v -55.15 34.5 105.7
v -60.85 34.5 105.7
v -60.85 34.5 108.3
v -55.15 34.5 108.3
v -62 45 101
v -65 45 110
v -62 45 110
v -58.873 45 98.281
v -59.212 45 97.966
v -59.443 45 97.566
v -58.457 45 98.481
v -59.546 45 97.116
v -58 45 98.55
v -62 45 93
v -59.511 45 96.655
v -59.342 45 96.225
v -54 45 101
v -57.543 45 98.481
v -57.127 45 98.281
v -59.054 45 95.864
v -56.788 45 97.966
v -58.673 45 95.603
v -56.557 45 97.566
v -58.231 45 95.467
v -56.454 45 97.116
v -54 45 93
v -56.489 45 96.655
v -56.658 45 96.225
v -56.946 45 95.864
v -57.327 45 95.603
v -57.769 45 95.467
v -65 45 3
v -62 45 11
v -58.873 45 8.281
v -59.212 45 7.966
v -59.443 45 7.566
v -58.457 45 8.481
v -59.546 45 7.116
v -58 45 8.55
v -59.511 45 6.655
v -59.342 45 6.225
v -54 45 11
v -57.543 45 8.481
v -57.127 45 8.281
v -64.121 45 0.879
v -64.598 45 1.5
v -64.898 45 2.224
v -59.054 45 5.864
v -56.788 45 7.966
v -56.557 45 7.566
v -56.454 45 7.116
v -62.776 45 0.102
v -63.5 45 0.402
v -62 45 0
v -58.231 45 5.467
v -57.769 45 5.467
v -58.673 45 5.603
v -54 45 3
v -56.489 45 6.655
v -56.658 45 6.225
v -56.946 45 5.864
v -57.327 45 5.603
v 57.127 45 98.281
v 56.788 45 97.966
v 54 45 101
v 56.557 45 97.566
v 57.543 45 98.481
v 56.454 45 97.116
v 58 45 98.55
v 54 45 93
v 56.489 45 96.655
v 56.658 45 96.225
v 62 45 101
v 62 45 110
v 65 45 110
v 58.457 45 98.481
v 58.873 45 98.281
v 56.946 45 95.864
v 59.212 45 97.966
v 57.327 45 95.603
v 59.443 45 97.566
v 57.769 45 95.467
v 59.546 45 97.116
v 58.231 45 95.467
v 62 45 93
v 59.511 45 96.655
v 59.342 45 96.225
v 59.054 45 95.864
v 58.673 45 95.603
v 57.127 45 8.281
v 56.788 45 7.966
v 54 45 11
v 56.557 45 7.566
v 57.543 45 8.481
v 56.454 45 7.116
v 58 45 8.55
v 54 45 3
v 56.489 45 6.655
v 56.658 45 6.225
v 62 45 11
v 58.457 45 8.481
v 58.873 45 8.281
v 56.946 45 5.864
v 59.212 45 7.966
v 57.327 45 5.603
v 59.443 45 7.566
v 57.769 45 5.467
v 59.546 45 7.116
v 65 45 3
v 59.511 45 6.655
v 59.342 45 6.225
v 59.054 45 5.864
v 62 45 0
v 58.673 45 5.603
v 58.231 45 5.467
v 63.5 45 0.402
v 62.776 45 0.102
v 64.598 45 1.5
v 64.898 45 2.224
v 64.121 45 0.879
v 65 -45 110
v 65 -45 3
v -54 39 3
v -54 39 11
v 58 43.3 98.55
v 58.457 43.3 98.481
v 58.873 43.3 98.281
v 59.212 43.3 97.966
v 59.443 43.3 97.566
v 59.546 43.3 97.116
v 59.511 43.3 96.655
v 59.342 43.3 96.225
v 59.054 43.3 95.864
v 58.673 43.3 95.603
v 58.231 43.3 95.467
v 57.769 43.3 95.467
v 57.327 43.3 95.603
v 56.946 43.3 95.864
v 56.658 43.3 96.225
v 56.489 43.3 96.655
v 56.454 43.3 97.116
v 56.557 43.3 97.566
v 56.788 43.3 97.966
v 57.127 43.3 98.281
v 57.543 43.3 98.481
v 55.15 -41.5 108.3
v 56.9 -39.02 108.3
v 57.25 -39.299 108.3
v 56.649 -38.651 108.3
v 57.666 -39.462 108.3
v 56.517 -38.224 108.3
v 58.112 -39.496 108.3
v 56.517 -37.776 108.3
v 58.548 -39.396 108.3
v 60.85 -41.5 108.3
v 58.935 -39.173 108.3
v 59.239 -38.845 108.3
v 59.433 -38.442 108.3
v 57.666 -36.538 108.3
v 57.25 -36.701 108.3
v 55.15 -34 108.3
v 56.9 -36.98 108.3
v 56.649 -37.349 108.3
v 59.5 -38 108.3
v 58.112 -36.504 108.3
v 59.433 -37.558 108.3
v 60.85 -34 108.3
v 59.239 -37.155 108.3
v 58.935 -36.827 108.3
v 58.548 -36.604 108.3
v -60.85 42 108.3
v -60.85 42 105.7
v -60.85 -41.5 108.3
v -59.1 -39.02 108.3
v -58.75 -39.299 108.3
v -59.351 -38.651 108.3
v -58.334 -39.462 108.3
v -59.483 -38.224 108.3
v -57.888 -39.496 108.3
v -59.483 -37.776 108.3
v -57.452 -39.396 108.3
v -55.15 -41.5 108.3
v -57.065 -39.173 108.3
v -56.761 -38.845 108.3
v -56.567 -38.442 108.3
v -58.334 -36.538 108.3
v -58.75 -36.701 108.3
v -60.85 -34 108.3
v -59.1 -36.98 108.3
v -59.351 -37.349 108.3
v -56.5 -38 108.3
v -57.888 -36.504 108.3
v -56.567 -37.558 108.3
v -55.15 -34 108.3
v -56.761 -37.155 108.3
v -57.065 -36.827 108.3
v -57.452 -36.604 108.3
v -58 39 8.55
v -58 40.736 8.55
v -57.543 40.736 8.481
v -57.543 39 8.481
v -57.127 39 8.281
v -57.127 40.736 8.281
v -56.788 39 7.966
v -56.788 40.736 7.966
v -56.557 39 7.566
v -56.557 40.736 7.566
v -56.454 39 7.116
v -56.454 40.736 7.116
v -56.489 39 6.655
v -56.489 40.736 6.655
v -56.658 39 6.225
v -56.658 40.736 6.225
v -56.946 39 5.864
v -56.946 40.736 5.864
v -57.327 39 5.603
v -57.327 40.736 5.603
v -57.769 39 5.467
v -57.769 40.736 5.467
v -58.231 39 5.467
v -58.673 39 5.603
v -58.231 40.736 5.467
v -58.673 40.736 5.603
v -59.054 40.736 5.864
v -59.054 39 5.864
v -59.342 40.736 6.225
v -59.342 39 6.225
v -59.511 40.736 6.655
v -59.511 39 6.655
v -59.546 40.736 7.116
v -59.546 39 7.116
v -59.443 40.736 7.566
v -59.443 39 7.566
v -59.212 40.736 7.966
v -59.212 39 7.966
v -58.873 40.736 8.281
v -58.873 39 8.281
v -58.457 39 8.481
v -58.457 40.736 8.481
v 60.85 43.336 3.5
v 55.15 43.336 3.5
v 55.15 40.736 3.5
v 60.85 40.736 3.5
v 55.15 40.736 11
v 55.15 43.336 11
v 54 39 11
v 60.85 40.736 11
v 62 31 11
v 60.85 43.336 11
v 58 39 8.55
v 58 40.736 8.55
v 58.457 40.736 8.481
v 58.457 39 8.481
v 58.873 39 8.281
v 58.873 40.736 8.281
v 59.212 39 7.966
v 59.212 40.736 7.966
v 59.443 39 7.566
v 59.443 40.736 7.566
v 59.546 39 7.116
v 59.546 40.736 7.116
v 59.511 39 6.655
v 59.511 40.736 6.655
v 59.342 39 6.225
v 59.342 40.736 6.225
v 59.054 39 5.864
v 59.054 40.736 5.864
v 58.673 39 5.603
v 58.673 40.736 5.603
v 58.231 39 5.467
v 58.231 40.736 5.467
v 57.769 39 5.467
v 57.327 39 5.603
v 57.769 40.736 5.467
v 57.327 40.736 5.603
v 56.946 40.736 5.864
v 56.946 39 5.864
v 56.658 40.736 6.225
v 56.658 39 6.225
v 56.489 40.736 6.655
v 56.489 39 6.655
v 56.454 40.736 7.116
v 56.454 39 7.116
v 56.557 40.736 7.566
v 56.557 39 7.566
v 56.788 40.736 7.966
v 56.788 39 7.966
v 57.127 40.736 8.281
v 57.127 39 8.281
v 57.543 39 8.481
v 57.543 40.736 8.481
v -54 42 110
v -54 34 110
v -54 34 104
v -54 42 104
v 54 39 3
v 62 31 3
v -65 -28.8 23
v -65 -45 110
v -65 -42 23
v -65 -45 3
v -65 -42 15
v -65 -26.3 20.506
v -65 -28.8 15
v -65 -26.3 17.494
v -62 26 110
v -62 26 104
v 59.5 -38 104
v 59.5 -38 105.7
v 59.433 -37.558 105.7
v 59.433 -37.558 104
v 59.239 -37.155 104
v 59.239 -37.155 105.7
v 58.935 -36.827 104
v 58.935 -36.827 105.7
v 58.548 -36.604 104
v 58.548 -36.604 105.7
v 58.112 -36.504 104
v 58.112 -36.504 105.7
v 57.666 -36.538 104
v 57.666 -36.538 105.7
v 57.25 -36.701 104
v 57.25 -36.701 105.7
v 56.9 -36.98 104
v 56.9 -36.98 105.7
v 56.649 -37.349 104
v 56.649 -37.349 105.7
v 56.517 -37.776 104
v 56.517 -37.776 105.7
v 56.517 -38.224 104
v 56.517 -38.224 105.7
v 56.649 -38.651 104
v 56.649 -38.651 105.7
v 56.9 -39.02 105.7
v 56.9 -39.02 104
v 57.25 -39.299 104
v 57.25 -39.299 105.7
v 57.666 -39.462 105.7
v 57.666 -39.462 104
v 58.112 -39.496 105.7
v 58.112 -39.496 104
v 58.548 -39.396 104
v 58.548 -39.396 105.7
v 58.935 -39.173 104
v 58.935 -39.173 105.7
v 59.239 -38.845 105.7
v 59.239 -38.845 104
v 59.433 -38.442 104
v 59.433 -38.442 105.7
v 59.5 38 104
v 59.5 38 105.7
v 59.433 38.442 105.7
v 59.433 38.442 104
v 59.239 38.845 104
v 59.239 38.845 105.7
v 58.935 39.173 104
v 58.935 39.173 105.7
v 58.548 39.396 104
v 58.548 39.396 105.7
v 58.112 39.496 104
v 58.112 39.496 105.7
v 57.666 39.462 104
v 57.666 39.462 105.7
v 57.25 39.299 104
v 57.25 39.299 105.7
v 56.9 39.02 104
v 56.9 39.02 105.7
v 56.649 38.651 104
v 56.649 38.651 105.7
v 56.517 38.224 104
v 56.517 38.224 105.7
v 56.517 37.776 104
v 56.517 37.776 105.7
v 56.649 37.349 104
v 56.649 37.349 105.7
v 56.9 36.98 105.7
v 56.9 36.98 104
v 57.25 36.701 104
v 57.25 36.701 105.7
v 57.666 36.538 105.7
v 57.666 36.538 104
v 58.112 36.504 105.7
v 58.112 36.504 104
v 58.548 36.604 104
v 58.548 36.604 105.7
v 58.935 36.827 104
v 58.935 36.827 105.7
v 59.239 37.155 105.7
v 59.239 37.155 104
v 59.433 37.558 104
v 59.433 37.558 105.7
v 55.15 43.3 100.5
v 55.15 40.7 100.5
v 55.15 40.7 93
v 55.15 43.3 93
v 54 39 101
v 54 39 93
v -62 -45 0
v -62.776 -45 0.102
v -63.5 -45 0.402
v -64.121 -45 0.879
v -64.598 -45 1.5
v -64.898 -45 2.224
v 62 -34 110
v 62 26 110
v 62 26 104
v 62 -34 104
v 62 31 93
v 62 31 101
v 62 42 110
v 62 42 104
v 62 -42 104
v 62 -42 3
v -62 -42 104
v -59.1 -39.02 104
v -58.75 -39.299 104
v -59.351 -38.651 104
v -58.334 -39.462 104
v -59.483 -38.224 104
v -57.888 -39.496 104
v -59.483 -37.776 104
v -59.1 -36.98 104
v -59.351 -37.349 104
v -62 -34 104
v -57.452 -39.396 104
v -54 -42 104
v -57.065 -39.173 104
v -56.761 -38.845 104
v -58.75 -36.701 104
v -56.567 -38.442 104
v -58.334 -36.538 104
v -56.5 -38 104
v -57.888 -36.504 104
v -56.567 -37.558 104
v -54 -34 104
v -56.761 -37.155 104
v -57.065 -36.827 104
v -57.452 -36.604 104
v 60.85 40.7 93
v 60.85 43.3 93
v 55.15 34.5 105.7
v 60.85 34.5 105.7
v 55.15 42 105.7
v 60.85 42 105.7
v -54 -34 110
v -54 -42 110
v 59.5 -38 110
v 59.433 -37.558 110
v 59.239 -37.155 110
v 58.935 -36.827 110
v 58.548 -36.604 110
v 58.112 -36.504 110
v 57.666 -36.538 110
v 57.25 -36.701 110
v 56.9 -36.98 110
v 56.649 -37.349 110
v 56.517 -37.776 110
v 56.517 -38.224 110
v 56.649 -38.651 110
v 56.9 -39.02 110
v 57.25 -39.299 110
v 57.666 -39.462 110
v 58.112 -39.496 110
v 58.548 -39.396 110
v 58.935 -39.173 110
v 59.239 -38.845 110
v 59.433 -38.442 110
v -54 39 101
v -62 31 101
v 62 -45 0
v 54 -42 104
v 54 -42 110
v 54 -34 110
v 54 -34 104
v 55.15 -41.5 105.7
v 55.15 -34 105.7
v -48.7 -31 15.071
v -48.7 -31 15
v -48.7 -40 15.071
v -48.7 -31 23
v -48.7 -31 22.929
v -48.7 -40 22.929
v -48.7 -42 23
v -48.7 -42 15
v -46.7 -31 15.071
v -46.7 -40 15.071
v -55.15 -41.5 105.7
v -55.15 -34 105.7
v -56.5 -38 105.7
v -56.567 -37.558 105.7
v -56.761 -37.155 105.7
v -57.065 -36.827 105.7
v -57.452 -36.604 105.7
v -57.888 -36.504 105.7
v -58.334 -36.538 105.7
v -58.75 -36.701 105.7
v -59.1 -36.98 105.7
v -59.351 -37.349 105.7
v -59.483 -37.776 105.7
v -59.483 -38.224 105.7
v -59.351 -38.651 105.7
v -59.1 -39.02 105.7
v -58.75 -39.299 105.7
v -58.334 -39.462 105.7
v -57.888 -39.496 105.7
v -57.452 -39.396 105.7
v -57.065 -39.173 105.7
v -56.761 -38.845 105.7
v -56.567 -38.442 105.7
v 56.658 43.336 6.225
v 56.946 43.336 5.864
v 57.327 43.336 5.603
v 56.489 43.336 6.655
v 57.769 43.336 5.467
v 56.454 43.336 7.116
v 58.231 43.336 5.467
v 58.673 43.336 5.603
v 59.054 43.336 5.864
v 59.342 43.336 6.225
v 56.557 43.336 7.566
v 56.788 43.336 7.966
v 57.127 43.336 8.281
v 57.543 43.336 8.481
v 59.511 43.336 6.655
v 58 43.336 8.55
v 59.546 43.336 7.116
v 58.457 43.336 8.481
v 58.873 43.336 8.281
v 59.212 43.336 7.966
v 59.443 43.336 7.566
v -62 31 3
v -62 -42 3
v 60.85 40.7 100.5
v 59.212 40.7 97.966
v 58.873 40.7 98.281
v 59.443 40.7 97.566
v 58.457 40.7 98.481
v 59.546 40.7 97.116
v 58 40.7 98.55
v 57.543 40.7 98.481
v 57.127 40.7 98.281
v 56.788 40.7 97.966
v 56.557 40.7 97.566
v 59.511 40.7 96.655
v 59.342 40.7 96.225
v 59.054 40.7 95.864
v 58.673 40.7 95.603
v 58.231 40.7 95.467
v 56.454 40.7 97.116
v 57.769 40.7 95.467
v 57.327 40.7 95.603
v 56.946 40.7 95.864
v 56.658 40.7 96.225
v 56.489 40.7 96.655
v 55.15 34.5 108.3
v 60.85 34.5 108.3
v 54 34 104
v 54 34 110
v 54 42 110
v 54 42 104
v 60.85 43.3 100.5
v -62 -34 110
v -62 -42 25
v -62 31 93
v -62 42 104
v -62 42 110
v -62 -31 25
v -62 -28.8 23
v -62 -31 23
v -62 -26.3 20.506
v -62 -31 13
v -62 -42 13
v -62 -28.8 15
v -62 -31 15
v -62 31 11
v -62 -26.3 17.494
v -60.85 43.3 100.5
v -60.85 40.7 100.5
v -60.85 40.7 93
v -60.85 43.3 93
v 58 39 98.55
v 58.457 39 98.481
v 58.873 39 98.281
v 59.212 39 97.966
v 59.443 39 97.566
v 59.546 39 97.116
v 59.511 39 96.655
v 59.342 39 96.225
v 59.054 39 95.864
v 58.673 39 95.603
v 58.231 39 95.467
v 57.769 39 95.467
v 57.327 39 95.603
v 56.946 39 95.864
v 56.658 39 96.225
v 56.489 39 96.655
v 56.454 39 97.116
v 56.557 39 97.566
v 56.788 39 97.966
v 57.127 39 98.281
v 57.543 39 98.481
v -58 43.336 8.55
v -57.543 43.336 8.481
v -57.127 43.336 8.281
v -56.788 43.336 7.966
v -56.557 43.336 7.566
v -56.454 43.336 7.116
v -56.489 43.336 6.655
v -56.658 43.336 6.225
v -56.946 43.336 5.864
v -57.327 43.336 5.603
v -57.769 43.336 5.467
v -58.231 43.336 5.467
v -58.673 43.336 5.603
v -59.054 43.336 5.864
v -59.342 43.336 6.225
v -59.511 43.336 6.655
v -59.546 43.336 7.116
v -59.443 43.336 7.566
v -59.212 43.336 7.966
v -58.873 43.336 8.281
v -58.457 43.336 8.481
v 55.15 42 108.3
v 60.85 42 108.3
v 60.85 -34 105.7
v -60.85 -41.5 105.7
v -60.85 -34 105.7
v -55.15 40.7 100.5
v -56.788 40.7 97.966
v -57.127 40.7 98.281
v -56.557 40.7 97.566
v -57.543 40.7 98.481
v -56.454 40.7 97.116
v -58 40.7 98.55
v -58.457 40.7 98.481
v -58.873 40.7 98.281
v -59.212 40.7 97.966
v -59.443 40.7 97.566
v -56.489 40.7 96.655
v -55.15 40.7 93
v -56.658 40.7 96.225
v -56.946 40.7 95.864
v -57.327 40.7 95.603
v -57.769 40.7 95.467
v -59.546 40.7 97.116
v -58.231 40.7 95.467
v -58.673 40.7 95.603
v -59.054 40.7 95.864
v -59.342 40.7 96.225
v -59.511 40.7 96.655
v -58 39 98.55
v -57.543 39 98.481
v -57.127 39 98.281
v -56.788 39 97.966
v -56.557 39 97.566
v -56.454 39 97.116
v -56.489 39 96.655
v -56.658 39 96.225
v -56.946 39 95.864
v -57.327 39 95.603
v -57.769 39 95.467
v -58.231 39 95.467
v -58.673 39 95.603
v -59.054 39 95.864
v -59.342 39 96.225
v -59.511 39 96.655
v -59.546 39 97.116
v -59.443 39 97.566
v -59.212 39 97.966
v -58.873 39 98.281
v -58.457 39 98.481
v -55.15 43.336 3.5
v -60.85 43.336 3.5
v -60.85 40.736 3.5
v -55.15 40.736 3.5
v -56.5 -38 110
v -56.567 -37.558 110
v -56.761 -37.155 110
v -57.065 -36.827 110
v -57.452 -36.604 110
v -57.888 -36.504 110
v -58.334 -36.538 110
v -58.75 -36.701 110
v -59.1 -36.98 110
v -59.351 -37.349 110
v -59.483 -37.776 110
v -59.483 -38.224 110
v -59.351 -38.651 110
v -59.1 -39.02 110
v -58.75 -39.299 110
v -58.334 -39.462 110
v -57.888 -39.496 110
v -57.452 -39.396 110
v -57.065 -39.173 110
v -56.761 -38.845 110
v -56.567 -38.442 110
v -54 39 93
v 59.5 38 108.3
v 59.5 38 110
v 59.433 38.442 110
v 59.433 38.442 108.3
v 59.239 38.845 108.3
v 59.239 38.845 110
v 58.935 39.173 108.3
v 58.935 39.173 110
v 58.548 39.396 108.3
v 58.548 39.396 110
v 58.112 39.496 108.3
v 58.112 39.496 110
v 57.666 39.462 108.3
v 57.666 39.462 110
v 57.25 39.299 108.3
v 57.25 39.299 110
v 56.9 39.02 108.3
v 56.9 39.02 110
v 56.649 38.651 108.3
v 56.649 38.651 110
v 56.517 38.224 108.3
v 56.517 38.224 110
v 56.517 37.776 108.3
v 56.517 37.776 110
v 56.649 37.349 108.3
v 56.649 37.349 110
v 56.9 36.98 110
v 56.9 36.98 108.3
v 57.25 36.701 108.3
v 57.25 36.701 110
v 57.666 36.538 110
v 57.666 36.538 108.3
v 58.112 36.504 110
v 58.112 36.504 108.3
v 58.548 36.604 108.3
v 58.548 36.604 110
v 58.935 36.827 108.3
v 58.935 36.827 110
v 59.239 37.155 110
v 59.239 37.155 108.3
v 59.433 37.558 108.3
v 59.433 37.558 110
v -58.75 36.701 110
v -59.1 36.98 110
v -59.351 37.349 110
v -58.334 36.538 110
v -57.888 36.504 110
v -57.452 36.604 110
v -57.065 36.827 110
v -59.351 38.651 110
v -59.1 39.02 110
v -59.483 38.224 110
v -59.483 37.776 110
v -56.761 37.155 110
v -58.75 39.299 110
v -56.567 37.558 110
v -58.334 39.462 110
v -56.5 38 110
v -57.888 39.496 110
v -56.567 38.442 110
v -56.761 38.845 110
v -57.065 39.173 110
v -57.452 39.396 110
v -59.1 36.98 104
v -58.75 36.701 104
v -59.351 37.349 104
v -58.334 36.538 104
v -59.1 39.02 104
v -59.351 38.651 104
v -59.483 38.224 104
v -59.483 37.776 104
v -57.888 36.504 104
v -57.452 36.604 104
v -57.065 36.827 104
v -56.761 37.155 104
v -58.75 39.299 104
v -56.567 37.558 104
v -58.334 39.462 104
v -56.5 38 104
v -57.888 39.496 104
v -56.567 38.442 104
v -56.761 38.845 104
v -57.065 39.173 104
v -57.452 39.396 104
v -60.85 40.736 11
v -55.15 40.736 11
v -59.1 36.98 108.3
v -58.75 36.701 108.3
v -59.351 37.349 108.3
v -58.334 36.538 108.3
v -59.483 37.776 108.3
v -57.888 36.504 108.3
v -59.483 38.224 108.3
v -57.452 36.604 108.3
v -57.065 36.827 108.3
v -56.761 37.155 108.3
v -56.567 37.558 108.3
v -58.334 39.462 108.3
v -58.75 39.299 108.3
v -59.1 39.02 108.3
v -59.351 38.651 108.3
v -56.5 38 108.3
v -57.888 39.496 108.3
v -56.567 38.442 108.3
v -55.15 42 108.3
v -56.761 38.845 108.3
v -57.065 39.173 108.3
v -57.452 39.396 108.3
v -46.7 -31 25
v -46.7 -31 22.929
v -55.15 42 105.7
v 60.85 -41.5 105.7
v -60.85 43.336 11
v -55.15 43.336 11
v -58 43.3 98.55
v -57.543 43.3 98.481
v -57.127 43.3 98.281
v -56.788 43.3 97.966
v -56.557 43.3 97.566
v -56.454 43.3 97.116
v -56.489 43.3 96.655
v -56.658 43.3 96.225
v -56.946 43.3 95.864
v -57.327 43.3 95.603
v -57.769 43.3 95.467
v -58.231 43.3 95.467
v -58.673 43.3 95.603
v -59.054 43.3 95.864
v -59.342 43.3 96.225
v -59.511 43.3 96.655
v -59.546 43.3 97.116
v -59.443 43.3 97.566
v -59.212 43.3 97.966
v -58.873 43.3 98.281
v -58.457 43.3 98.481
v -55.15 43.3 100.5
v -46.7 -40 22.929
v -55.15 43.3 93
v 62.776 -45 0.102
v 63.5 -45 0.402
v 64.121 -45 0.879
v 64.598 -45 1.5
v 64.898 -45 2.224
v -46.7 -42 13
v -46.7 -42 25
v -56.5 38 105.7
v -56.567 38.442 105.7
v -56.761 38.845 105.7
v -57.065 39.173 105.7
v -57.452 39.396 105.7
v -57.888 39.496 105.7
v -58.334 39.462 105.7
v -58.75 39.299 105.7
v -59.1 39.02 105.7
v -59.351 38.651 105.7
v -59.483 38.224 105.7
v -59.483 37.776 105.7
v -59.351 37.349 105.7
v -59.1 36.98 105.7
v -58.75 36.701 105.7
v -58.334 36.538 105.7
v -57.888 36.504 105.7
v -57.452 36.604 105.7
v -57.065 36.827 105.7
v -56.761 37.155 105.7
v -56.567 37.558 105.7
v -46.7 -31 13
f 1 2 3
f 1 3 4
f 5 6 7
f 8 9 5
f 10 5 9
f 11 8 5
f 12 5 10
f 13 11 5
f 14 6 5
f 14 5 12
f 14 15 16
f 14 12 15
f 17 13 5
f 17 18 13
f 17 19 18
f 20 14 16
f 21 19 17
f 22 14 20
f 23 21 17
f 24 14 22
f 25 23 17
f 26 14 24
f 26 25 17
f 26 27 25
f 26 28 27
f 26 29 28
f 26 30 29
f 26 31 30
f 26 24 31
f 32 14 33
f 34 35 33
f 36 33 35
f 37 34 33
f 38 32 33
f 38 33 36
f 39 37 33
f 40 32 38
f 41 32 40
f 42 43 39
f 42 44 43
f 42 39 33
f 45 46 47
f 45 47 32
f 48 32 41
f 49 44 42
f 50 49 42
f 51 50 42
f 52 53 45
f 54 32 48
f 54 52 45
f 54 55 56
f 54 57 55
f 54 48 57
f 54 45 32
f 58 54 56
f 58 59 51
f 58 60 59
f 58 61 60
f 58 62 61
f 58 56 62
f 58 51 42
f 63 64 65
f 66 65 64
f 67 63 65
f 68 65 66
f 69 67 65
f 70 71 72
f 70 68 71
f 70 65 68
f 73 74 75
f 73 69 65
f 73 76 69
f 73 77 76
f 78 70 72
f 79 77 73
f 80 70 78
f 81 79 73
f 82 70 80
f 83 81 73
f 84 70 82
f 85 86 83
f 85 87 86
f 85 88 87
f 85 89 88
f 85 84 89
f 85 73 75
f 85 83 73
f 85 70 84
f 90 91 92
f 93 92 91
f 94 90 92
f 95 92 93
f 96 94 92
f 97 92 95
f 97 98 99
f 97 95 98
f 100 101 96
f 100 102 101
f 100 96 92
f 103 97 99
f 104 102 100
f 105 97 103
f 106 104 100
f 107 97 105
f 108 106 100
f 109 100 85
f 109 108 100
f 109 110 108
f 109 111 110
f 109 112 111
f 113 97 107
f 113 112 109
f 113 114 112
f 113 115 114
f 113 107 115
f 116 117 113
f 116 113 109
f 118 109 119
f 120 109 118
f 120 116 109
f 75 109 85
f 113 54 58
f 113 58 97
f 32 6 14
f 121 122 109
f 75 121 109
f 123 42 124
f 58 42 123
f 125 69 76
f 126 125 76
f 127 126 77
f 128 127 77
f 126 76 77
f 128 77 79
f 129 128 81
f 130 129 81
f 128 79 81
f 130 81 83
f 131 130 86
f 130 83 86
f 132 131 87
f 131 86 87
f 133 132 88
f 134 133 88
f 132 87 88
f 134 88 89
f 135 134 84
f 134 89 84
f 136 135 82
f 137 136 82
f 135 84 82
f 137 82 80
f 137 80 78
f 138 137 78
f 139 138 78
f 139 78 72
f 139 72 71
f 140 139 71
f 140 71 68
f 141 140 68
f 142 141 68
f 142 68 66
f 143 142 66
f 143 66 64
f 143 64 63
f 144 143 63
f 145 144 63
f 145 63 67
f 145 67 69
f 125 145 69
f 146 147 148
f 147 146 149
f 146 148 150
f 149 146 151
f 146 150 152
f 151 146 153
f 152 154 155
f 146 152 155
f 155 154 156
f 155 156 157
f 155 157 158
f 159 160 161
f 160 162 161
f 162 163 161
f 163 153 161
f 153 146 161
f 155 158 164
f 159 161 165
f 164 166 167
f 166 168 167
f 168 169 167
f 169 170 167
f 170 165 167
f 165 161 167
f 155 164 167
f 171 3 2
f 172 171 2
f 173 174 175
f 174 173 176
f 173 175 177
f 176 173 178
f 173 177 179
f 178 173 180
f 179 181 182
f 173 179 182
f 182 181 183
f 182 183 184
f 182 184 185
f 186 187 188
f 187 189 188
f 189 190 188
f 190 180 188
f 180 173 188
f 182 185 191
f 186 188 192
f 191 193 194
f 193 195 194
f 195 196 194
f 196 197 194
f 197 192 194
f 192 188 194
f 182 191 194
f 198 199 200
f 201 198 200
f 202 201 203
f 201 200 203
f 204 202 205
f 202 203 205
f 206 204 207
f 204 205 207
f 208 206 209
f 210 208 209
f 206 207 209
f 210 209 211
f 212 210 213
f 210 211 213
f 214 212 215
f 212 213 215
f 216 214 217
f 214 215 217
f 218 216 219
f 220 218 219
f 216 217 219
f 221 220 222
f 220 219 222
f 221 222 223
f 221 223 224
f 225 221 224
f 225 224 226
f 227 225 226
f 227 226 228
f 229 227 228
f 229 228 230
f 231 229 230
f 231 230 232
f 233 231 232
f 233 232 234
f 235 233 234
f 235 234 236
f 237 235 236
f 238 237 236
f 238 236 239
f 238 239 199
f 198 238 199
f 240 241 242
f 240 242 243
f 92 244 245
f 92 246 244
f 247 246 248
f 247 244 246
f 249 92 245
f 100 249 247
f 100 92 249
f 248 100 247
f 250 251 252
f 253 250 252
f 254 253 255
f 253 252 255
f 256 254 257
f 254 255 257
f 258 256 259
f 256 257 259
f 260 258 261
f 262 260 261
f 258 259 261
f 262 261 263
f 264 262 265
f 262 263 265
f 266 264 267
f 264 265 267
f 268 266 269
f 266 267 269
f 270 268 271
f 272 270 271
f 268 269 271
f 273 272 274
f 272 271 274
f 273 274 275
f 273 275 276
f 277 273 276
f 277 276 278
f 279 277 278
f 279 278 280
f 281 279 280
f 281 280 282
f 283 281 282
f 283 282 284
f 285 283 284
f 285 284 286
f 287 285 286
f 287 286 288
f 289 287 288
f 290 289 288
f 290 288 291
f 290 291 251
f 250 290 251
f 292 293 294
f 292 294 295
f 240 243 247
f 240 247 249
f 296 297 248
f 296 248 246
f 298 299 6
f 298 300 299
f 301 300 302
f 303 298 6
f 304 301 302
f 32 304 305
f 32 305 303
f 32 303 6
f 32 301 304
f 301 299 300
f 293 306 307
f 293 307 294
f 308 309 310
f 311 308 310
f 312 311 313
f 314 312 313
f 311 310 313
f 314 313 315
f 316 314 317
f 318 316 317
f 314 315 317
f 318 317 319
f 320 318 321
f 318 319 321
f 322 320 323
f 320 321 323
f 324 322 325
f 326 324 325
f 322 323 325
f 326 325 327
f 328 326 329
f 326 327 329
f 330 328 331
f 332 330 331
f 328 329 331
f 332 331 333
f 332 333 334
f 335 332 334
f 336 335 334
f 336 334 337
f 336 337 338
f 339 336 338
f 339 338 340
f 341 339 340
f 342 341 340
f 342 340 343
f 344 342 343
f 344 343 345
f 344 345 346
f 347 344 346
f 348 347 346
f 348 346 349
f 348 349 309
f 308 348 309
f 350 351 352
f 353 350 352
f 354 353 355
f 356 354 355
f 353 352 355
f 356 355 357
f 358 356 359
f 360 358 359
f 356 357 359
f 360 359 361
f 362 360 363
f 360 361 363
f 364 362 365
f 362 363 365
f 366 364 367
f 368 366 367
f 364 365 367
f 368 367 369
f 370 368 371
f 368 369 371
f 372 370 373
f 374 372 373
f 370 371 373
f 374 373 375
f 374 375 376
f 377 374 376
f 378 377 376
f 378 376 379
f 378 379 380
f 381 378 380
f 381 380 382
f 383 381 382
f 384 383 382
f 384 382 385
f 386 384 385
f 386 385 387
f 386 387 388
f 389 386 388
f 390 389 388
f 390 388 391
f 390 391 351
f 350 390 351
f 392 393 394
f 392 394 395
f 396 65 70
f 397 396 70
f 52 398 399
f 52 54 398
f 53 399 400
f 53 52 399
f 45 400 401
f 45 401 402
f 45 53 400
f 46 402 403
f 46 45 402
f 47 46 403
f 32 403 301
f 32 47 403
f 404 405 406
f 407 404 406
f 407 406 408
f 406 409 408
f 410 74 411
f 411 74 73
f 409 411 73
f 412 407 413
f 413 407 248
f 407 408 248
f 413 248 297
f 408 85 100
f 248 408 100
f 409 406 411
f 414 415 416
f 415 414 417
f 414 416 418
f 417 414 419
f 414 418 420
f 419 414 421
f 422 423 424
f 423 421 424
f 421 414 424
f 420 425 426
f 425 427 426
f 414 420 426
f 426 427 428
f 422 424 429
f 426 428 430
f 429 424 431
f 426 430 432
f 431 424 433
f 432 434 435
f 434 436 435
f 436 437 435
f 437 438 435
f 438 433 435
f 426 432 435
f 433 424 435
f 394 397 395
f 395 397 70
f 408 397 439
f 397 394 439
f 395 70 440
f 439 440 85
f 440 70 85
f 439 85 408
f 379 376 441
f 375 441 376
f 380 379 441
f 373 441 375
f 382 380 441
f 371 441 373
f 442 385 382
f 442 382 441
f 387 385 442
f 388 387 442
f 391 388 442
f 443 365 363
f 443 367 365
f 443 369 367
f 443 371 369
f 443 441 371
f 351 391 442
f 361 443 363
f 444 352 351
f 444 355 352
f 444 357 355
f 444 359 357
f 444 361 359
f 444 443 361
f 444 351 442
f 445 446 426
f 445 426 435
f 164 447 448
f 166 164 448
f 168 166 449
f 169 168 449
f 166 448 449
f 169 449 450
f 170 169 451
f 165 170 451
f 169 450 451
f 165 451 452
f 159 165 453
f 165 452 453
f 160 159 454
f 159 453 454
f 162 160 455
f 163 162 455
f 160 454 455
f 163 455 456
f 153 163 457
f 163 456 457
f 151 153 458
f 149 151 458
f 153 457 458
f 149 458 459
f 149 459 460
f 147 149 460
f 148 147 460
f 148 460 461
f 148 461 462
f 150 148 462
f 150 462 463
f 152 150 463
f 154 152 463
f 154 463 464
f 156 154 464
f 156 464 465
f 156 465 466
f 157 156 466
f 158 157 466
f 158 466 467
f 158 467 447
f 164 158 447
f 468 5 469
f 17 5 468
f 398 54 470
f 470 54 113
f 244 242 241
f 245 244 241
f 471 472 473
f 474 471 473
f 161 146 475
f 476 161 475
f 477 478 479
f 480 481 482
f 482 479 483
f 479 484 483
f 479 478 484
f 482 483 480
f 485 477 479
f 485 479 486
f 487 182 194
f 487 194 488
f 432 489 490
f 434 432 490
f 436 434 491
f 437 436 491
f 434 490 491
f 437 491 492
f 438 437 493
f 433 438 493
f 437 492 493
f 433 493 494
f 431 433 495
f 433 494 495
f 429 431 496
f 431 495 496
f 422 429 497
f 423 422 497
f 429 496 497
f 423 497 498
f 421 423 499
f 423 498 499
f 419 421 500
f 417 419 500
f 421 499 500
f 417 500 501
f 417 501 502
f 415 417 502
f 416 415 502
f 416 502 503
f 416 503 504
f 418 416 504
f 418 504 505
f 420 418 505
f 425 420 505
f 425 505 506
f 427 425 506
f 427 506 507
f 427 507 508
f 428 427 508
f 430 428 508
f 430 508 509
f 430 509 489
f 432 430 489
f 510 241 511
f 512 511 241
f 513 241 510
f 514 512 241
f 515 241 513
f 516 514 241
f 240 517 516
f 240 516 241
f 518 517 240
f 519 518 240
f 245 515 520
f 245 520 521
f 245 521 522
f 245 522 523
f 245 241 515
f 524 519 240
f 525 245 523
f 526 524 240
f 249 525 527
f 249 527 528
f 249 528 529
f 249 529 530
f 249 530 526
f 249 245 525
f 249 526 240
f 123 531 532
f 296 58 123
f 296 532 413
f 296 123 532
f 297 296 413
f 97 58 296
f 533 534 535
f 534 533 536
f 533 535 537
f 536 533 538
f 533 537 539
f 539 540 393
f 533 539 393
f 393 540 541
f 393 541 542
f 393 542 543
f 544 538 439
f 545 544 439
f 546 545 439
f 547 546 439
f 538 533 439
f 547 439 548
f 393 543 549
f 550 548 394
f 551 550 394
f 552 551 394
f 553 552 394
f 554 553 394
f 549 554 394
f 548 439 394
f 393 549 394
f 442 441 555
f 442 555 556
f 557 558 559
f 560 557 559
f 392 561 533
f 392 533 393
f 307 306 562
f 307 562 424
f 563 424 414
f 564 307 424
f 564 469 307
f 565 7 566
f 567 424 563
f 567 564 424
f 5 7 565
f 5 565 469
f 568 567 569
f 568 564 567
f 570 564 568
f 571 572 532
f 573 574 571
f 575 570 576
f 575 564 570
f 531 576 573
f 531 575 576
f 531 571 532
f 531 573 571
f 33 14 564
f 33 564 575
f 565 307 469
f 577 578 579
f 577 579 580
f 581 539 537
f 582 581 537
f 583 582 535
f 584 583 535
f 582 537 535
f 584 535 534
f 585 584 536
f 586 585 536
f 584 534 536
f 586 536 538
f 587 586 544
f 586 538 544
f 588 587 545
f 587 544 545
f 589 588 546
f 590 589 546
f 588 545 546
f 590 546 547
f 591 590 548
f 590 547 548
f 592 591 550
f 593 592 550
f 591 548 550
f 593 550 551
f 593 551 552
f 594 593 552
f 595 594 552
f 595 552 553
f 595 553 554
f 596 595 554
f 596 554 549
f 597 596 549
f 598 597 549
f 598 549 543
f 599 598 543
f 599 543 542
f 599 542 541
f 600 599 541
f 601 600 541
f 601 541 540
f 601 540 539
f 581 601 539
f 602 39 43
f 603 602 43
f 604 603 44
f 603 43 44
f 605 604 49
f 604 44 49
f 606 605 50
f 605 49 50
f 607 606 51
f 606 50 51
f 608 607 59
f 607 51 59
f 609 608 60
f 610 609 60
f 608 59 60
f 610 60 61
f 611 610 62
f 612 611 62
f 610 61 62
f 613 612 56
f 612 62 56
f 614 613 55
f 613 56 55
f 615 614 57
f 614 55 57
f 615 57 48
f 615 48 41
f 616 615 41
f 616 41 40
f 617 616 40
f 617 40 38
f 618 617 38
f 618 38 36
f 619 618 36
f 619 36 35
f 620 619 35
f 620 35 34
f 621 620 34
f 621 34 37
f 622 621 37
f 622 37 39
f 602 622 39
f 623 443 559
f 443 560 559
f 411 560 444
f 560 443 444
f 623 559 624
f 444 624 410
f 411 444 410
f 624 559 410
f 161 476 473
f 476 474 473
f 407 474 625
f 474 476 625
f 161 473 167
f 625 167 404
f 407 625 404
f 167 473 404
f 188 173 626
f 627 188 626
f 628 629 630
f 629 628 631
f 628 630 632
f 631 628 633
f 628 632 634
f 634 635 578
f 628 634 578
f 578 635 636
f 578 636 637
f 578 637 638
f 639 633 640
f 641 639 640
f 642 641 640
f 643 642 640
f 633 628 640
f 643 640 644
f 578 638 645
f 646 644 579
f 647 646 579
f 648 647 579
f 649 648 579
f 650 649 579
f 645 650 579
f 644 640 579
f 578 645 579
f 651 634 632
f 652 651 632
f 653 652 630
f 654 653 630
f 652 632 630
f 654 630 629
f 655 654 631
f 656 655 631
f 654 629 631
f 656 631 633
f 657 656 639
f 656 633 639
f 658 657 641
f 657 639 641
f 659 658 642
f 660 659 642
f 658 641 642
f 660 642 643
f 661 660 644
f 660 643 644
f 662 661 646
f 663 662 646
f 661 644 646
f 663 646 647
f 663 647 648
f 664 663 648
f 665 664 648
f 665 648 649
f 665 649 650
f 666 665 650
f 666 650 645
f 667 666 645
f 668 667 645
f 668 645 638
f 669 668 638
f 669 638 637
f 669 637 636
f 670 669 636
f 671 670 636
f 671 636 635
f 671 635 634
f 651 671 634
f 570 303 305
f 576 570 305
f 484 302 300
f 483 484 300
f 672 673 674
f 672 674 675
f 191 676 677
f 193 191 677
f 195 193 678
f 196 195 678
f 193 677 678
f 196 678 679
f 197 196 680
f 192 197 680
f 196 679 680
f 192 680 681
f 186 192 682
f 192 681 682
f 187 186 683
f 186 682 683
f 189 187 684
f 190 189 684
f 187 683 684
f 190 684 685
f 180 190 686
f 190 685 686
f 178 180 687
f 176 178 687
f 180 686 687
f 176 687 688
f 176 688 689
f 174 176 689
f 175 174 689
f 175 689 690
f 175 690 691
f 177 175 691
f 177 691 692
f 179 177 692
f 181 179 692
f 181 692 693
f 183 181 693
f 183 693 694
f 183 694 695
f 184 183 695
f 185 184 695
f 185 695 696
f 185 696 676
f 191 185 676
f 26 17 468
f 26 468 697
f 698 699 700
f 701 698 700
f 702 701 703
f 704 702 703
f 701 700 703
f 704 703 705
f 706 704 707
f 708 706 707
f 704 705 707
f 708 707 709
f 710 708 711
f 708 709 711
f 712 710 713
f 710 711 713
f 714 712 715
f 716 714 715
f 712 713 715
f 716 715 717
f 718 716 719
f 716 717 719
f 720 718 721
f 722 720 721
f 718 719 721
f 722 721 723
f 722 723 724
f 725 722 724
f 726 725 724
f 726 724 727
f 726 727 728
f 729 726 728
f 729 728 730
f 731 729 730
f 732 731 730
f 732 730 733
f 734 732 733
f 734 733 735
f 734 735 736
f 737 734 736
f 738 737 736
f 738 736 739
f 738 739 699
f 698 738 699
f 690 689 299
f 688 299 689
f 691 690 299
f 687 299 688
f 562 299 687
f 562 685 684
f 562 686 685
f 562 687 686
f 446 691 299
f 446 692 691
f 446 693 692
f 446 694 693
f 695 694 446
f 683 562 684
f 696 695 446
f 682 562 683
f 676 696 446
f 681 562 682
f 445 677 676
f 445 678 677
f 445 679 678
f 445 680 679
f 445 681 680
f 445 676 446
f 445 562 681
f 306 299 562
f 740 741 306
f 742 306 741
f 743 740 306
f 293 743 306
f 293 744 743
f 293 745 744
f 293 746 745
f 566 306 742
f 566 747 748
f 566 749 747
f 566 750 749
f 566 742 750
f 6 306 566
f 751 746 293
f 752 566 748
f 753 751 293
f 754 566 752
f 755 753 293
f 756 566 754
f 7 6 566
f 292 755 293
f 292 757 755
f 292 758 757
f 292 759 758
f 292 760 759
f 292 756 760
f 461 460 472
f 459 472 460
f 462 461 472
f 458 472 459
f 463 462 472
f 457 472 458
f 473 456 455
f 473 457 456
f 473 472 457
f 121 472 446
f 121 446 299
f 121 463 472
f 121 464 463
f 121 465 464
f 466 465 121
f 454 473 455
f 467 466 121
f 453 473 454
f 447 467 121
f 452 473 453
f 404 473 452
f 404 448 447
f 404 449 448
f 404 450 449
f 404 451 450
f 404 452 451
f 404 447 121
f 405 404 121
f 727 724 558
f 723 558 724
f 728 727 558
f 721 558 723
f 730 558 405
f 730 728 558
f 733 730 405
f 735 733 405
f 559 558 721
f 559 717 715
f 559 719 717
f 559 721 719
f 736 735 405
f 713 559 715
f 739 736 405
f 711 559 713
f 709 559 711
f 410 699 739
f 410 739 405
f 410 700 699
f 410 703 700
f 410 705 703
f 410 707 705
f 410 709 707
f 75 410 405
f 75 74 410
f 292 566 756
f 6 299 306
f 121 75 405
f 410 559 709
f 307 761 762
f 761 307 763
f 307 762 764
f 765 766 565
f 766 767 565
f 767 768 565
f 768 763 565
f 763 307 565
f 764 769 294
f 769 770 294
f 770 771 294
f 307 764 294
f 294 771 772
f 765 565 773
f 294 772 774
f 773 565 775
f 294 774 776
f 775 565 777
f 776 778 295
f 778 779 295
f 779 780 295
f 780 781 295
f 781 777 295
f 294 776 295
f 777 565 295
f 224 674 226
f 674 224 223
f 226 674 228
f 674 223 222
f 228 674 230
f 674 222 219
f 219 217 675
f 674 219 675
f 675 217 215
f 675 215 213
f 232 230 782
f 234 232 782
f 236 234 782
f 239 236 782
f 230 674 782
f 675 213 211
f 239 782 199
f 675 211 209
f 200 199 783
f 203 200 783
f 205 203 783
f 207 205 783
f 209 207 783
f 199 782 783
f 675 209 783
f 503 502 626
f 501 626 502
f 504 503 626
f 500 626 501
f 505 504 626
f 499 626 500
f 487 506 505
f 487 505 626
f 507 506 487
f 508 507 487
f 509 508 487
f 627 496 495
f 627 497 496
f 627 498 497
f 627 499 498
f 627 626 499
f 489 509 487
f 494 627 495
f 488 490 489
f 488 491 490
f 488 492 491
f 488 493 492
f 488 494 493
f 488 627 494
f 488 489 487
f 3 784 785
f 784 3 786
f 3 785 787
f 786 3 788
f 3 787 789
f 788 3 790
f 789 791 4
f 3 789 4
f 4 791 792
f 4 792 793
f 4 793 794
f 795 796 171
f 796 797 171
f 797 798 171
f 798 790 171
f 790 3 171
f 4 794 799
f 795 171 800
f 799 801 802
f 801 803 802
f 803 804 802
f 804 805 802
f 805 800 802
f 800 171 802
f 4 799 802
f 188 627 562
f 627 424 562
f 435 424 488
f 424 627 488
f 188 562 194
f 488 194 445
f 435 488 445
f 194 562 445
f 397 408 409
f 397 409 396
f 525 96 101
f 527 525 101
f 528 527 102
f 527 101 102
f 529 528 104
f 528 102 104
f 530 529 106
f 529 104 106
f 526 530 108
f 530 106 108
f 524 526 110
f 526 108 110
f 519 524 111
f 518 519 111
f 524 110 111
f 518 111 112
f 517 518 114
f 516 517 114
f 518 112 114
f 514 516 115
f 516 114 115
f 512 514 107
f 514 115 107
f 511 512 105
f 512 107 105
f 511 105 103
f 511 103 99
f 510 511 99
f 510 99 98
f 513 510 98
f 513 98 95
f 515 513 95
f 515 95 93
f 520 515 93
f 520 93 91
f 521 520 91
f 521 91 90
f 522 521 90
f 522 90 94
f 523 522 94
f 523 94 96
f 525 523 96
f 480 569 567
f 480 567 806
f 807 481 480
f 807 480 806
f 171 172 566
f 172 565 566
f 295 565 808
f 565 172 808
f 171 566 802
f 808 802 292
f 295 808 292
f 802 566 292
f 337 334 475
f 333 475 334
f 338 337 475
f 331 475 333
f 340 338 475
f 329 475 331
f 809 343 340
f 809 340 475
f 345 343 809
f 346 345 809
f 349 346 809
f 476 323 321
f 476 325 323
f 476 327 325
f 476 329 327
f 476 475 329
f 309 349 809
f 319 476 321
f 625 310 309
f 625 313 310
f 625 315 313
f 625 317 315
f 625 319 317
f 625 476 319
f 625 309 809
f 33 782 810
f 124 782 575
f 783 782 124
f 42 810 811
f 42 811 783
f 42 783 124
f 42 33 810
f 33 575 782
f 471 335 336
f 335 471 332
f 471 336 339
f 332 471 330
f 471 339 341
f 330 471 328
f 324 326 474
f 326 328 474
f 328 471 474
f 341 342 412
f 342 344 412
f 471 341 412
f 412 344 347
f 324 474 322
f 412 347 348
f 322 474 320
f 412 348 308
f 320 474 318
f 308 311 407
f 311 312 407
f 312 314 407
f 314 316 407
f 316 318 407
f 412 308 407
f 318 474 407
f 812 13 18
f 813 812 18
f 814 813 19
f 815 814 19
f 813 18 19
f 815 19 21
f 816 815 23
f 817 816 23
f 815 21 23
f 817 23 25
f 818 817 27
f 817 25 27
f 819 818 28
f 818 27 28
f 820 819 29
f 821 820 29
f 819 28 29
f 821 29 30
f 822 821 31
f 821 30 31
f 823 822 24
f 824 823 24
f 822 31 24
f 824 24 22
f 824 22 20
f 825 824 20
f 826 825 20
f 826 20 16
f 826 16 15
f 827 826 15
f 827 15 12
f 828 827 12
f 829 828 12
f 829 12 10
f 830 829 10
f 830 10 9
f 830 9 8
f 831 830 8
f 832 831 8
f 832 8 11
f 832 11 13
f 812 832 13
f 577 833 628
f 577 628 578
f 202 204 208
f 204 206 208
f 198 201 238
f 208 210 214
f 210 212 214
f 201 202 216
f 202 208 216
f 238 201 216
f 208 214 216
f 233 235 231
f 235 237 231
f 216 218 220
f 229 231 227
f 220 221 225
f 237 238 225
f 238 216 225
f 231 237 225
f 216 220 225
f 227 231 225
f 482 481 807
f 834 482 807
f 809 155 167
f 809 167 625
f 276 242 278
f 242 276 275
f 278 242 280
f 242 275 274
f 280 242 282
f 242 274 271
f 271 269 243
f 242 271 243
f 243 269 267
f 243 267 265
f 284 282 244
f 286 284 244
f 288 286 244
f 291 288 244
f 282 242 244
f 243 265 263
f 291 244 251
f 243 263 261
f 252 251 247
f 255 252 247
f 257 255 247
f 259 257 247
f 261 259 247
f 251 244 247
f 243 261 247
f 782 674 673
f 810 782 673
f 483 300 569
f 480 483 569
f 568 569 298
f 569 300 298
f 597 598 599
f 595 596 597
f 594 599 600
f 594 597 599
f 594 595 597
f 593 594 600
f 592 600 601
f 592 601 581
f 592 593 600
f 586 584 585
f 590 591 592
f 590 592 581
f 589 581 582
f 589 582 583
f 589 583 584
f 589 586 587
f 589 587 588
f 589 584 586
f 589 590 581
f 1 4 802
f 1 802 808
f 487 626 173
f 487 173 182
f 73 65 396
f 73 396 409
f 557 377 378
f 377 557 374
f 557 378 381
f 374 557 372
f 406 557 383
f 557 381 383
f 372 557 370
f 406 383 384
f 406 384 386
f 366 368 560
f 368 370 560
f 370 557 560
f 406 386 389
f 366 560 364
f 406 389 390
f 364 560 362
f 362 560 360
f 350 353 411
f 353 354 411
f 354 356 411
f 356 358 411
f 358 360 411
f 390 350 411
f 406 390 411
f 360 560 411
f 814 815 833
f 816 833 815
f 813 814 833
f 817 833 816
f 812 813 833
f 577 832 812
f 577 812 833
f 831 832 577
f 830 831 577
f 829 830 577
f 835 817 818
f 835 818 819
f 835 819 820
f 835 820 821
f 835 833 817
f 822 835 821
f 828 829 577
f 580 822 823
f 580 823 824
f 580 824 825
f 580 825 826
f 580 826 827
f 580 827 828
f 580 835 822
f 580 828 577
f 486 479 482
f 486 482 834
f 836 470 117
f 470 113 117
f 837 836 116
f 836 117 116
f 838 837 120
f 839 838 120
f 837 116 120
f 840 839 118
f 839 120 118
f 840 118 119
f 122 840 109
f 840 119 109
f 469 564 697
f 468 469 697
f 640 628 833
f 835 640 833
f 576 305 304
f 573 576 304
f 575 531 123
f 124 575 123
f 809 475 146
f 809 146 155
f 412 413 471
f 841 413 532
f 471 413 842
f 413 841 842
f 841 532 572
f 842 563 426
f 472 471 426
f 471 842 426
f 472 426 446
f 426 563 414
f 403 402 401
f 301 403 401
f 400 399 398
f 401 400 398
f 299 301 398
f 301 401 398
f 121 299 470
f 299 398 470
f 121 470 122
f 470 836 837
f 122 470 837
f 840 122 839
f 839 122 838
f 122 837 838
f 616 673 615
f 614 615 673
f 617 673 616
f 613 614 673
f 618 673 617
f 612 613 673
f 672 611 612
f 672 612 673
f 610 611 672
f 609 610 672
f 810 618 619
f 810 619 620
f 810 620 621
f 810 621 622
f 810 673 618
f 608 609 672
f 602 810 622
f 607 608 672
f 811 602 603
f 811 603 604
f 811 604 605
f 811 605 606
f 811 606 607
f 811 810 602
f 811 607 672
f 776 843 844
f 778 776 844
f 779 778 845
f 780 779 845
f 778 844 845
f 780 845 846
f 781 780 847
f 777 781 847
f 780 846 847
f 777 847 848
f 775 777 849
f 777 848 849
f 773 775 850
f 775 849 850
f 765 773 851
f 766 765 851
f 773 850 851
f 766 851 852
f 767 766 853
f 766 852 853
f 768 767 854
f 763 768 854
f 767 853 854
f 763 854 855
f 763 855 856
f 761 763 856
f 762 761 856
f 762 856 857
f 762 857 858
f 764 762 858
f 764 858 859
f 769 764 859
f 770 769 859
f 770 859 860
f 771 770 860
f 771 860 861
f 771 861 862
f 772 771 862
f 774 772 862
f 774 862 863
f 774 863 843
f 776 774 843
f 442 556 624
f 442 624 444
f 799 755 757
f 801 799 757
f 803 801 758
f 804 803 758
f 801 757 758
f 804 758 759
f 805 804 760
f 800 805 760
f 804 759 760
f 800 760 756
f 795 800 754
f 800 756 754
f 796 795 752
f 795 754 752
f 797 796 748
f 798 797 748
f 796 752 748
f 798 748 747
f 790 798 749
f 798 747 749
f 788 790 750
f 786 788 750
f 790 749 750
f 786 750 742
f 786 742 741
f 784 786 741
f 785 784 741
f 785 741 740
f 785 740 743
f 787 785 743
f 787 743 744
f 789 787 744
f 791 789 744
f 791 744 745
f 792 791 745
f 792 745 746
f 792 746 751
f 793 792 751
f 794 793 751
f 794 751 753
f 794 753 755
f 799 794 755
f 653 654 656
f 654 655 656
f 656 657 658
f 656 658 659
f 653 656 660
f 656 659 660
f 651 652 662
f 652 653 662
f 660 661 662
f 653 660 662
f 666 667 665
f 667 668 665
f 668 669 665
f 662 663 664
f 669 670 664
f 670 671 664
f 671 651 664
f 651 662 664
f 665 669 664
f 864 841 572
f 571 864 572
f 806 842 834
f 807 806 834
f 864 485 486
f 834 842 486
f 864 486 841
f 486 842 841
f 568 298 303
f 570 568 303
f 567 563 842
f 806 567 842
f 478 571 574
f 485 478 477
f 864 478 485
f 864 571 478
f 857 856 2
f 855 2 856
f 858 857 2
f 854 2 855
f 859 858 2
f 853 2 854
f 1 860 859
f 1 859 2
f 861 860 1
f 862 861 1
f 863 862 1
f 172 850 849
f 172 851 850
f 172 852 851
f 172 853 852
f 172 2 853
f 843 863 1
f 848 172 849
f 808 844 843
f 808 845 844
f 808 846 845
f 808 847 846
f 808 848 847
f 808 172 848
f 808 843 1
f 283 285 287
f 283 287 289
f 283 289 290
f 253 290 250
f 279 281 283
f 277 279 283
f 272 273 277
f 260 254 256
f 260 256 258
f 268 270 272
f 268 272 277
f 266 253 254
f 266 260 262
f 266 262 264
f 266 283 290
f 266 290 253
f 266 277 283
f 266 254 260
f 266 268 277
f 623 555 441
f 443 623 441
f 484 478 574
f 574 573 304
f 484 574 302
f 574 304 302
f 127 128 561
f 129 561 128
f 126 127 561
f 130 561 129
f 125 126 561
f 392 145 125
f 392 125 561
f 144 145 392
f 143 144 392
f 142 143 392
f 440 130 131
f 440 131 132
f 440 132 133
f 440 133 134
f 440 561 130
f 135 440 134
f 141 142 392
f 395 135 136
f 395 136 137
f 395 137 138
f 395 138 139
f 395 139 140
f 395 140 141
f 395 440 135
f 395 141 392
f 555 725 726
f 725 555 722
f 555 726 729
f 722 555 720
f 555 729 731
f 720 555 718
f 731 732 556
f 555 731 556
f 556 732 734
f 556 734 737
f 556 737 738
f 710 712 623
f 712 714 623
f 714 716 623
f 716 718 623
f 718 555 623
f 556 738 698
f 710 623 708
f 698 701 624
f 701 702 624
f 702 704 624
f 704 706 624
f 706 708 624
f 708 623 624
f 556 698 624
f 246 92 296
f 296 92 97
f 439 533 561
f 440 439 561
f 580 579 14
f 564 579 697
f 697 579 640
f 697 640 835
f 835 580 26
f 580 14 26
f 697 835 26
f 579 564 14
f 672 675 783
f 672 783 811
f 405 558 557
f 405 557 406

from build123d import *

# Parameters (mm, degrees)
SKETCH_2_W                  = 130
SKETCH_2_H                  = 90
EXTRUDE_1_DEPTH             = 110
SKETCH_3_W                  = 124
SKETCH_3_H                  = 107
CUT_EXTRUDE_1_DEPTH         = 87
CUT_EXTRUDE_5_REACH         = 178.139
EXTRUDE_5_DEPTH             = 11
SKETCH_16_W                 = 5.817441426
SKETCH_16_H                 = 7.857396668
CUT_EXTRUDE_6_DEPTH         = 9
FILLET_8_R                  = 3
FILLET_9_R                  = 3
SKETCH_17_W                 = 8
SKETCH_17_H                 = 8
SKETCH_17_R                 = 1.5
EXTRUDE_6_DEPTH             = 6
PATTERN_LINEAR_1_COUNT      = 2
PATTERN_LINEAR_1_PITCH      = 116
PATTERN_LINEAR_1_COUNT_DIR2 = 2
PATTERN_LINEAR_1_PITCH_DIR2 = 76
EXTRUDE_7_DEPTH             = 6
EXTRUDE_8_DEPTH             = 6
SKETCH_20_W                 = 5.7
SKETCH_20_H                 = 2.6
CUT_EXTRUDE_7_DEPTH         = 7.5
PATTERN_LINEAR_2_COUNT      = 2
PATTERN_LINEAR_2_PITCH      = 116
PATTERN_LINEAR_2_COUNT_DIR2 = 2
PATTERN_LINEAR_2_PITCH_DIR2 = 76
SKETCH_23_W                 = 8
SKETCH_23_H                 = 8
SKETCH_23_R                 = 1.55
EXTRUDE_9_DEPTH             = 6
PATTERN_LINEAR_3_COUNT      = 2
PATTERN_LINEAR_3_PITCH      = 116
PATTERN_LINEAR_3_COUNT_DIR2 = 2
PATTERN_LINEAR_3_PITCH_DIR2 = 90
EXTRUDE_10_DEPTH            = 8
EXTRUDE_11_DEPTH            = 8
PATTERN_LINEAR_4_COUNT      = 2
PATTERN_LINEAR_4_PITCH      = 90
PATTERN_LINEAR_5_COUNT      = 2
PATTERN_LINEAR_5_PITCH      = 90
SKETCH_27_W                 = 5.7
SKETCH_27_H                 = 2.6
CUT_EXTRUDE_8_DEPTH         = 7.5
PATTERN_LINEAR_6_COUNT      = 2
PATTERN_LINEAR_6_PITCH      = 116
SKETCH_28_W                 = 5.7
SKETCH_28_H                 = 2.6
CUT_EXTRUDE_9_DEPTH         = 7.5
PATTERN_LINEAR_7_COUNT      = 2
PATTERN_LINEAR_7_PITCH      = 116


with BuildPart() as part:
    # Эскиз2 → Бобышка-Вытянуть1 (new body)
    with BuildSketch(Plane.XY):
        Rectangle(SKETCH_2_W, SKETCH_2_H)
    extrude(amount=EXTRUDE_1_DEPTH)

    # Эскиз3 → Вырез-Вытянуть1 (cut)
    with BuildSketch(Plane(origin=(0, 45, 0), x_dir=(1, 0, 0), z_dir=(0, 1, 0))):
        with Locations((0, -56.5)):
            Rectangle(SKETCH_3_W, SKETCH_3_H)
    extrude(amount=-CUT_EXTRUDE_1_DEPTH, mode=Mode.SUBTRACT)

    # Эскиз13 → Вырез-Вытянуть5 (cut, up to next)
    with BuildSketch(Plane.ZY.offset(65), mode=Mode.PRIVATE) as cut_extrude_5_sk1:
        Polygon((15, -42), (23, -42), (23, -28.8), (20.505788704, -26.3), (17.494211296, -26.3), (15, -28.8), align=None)
    cut_extrude_5_tool1 = extrude(cut_extrude_5_sk1.sketch, amount=-CUT_EXTRUDE_5_REACH, mode=Mode.PRIVATE) & part.part
    add(cut_extrude_5_tool1.solids().sort_by_distance((-65, -34.516546, 19))[0], mode=Mode.SUBTRACT)

    # Эскиз15 → Бобышка-Вытянуть5 (add)
    with BuildSketch(Plane(origin=(0, -42, 0), x_dir=(1, 0, 0), z_dir=(0, 1, 0))):
        Polygon((-62, -25), (-46.7, -25), (-46.7, -13), (-62, -13), (-62, -15), (-48.7, -15), (-48.7, -23), (-62, -23), align=None)
    extrude(amount=EXTRUDE_5_DEPTH)

    # Эскиз16 → Вырез-Вытянуть6 (cut)
    with BuildSketch(Plane(origin=(0, -31, 0), x_dir=(1, 0, 0), z_dir=(0, 1, 0))):
        with Locations((-46.7, -19)):
            Rectangle(SKETCH_16_W, SKETCH_16_H)
    extrude(amount=-CUT_EXTRUDE_6_DEPTH, mode=Mode.SUBTRACT)

    # Скругление8
    fillet_8_edges = [part.edges().sort_by_distance(p)[0] for p in [
        (-65, 0, 0),
    ]]
    fillet(fillet_8_edges, radius=FILLET_8_R)

    # Скругление9
    fillet_9_edges = [part.edges().sort_by_distance(p)[0] for p in [
        (65, 0, 0),
    ]]
    fillet(fillet_9_edges, radius=FILLET_9_R)

    # Эскиз17 → Бобышка-Вытянуть6 (add)
    with BuildSketch(Plane.XY.offset(110)):
        with Locations((-58, -38)):
            Rectangle(SKETCH_17_W, SKETCH_17_H)
        with Locations((-58, -38)):
            Circle(SKETCH_17_R, mode=Mode.SUBTRACT)
    extrude_6 = extrude(amount=-EXTRUDE_6_DEPTH)

    # Линейный массив1: Extrude 6 2 × 2
    with Locations(*[(i * PATTERN_LINEAR_1_PITCH, j * PATTERN_LINEAR_1_PITCH_DIR2, 0) for i in range(PATTERN_LINEAR_1_COUNT) for j in range(PATTERN_LINEAR_1_COUNT_DIR2) if (i, j) != (0, 0)]):
        add(extrude_6)

    # Эскиз18 → Бобышка-Вытянуть7 (add)
    with BuildSketch(Plane.XY.offset(110)):
        Polygon((-54, 34), (-62, 34), (-62, 26), align=None)
    extrude(amount=-EXTRUDE_7_DEPTH)

    # Эскиз19 → Бобышка-Вытянуть8 (add)
    with BuildSketch(Plane.XY.offset(110)):
        Polygon((62, 34), (54, 34), (62, 26), align=None)
    extrude(amount=-EXTRUDE_8_DEPTH)

    # Эскиз20 → Вырез-Вытянуть7 (cut)
    with BuildSketch(Plane(origin=(0, -34, 0), x_dir=(1, 0, 0), z_dir=(0, 1, 0))):
        with Locations((-58, -107)):
            Rectangle(SKETCH_20_W, SKETCH_20_H)
    cut_extrude_7 = extrude(amount=-CUT_EXTRUDE_7_DEPTH, mode=Mode.SUBTRACT)

    # Линейный массив2: Cut-Extrude 7 2 × 2
    with Locations(*[(i * PATTERN_LINEAR_2_PITCH, j * PATTERN_LINEAR_2_PITCH_DIR2, 0) for i in range(PATTERN_LINEAR_2_COUNT) for j in range(PATTERN_LINEAR_2_COUNT_DIR2) if (i, j) != (0, 0)]):
        add(cut_extrude_7, mode=Mode.SUBTRACT)



with BuildPart() as body_2:
    # Эскиз23 → Бобышка-Вытянуть9 (new body)
    with BuildSketch(Plane(origin=(0, 45, 0), x_dir=(1, 0, 0), z_dir=(0, 1, 0))):
        with Locations((-58, -7)):
            Rectangle(SKETCH_23_W, SKETCH_23_H)
        with Locations(Location((-58, -7, 0), (0, 0, 270))):
            Circle(SKETCH_23_R, mode=Mode.SUBTRACT)
    extrude_9 = extrude(amount=-EXTRUDE_9_DEPTH)


with BuildPart() as pattern_linear_3_1:
    # Линейный массив3: pattern copy
    add(extrude_9.moved(Location(Vector(1, 0, 0) * (0 * PATTERN_LINEAR_3_PITCH) + Vector(0, 0, 1) * (1 * PATTERN_LINEAR_3_PITCH_DIR2))))


with BuildPart() as pattern_linear_3_2:
    # Линейный массив3: pattern copy
    add(extrude_9.moved(Location(Vector(1, 0, 0) * (1 * PATTERN_LINEAR_3_PITCH) + Vector(0, 0, 1) * (0 * PATTERN_LINEAR_3_PITCH_DIR2))))


with BuildPart() as pattern_linear_3_3:
    # Линейный массив3: pattern copy
    add(extrude_9.moved(Location(Vector(1, 0, 0) * (1 * PATTERN_LINEAR_3_PITCH) + Vector(0, 0, 1) * (1 * PATTERN_LINEAR_3_PITCH_DIR2))))


with BuildPart() as part_1:
    add(part.part)

    add(body_2.part)  # Бобышка-Вытянуть10 merges body 2
    # Эскиз24 → Бобышка-Вытянуть10 (add)
    with BuildSketch(Plane.XY.offset(3)):
        Polygon((-54, 39), (-62, 39), (-62, 31), align=None)
    extrude_10 = extrude(amount=EXTRUDE_10_DEPTH)


    add(pattern_linear_3_2.part)  # Бобышка-Вытянуть11 merges Линейный массив3_2
    # Эскиз25 → Бобышка-Вытянуть11 (add)
    with BuildSketch(Plane.XY.offset(3)):
        Polygon((54, 39), (62, 39), (62, 31), align=None)
    extrude_11 = extrude(amount=EXTRUDE_11_DEPTH)


    add(pattern_linear_3_1.part)  # Линейный массив4 merges Линейный массив3_1
    # Линейный массив4: Бобышка-Вытянуть10 ×2
    with Locations(*[(0, 0, i * PATTERN_LINEAR_4_PITCH) for i in range(1, PATTERN_LINEAR_4_COUNT)]):
        add(extrude_10)


    add(pattern_linear_3_3.part)  # Линейный массив5 merges Линейный массив3_3
    # Линейный массив5: Бобышка-Вытянуть11 ×2
    with Locations(*[(0, 0, i * PATTERN_LINEAR_5_PITCH) for i in range(1, PATTERN_LINEAR_5_COUNT)]):
        add(extrude_11)

    # Эскиз27 → Вырез-Вытянуть8 (cut)
    with BuildSketch(Plane.XY.offset(11)):
        with Locations((-58, 42.036350265)):
            Rectangle(SKETCH_27_W, SKETCH_27_H)
    cut_extrude_8 = extrude(amount=-CUT_EXTRUDE_8_DEPTH, mode=Mode.SUBTRACT)

    # Линейный массив6: Вырез-Вытянуть8 ×2
    with Locations(*[(i * PATTERN_LINEAR_6_PITCH, 0, 0) for i in range(1, PATTERN_LINEAR_6_COUNT)]):
        add(cut_extrude_8, mode=Mode.SUBTRACT)

    # Эскиз28 → Вырез-Вытянуть9 (cut)
    with BuildSketch(Plane(origin=(0, 0, 93), x_dir=(-1, 0, 0), z_dir=(0, 0, -1))):
        with Locations((-58, 42)):
            Rectangle(SKETCH_28_W, SKETCH_28_H)
    cut_extrude_9 = extrude(amount=-CUT_EXTRUDE_9_DEPTH, mode=Mode.SUBTRACT)

    # Линейный массив7: Вырез-Вытянуть9 ×2
    with Locations(*[(-i * PATTERN_LINEAR_7_PITCH, 0, 0) for i in range(1, PATTERN_LINEAR_7_COUNT)]):
        add(cut_extrude_9, mode=Mode.SUBTRACT)


solid = part_1.part
